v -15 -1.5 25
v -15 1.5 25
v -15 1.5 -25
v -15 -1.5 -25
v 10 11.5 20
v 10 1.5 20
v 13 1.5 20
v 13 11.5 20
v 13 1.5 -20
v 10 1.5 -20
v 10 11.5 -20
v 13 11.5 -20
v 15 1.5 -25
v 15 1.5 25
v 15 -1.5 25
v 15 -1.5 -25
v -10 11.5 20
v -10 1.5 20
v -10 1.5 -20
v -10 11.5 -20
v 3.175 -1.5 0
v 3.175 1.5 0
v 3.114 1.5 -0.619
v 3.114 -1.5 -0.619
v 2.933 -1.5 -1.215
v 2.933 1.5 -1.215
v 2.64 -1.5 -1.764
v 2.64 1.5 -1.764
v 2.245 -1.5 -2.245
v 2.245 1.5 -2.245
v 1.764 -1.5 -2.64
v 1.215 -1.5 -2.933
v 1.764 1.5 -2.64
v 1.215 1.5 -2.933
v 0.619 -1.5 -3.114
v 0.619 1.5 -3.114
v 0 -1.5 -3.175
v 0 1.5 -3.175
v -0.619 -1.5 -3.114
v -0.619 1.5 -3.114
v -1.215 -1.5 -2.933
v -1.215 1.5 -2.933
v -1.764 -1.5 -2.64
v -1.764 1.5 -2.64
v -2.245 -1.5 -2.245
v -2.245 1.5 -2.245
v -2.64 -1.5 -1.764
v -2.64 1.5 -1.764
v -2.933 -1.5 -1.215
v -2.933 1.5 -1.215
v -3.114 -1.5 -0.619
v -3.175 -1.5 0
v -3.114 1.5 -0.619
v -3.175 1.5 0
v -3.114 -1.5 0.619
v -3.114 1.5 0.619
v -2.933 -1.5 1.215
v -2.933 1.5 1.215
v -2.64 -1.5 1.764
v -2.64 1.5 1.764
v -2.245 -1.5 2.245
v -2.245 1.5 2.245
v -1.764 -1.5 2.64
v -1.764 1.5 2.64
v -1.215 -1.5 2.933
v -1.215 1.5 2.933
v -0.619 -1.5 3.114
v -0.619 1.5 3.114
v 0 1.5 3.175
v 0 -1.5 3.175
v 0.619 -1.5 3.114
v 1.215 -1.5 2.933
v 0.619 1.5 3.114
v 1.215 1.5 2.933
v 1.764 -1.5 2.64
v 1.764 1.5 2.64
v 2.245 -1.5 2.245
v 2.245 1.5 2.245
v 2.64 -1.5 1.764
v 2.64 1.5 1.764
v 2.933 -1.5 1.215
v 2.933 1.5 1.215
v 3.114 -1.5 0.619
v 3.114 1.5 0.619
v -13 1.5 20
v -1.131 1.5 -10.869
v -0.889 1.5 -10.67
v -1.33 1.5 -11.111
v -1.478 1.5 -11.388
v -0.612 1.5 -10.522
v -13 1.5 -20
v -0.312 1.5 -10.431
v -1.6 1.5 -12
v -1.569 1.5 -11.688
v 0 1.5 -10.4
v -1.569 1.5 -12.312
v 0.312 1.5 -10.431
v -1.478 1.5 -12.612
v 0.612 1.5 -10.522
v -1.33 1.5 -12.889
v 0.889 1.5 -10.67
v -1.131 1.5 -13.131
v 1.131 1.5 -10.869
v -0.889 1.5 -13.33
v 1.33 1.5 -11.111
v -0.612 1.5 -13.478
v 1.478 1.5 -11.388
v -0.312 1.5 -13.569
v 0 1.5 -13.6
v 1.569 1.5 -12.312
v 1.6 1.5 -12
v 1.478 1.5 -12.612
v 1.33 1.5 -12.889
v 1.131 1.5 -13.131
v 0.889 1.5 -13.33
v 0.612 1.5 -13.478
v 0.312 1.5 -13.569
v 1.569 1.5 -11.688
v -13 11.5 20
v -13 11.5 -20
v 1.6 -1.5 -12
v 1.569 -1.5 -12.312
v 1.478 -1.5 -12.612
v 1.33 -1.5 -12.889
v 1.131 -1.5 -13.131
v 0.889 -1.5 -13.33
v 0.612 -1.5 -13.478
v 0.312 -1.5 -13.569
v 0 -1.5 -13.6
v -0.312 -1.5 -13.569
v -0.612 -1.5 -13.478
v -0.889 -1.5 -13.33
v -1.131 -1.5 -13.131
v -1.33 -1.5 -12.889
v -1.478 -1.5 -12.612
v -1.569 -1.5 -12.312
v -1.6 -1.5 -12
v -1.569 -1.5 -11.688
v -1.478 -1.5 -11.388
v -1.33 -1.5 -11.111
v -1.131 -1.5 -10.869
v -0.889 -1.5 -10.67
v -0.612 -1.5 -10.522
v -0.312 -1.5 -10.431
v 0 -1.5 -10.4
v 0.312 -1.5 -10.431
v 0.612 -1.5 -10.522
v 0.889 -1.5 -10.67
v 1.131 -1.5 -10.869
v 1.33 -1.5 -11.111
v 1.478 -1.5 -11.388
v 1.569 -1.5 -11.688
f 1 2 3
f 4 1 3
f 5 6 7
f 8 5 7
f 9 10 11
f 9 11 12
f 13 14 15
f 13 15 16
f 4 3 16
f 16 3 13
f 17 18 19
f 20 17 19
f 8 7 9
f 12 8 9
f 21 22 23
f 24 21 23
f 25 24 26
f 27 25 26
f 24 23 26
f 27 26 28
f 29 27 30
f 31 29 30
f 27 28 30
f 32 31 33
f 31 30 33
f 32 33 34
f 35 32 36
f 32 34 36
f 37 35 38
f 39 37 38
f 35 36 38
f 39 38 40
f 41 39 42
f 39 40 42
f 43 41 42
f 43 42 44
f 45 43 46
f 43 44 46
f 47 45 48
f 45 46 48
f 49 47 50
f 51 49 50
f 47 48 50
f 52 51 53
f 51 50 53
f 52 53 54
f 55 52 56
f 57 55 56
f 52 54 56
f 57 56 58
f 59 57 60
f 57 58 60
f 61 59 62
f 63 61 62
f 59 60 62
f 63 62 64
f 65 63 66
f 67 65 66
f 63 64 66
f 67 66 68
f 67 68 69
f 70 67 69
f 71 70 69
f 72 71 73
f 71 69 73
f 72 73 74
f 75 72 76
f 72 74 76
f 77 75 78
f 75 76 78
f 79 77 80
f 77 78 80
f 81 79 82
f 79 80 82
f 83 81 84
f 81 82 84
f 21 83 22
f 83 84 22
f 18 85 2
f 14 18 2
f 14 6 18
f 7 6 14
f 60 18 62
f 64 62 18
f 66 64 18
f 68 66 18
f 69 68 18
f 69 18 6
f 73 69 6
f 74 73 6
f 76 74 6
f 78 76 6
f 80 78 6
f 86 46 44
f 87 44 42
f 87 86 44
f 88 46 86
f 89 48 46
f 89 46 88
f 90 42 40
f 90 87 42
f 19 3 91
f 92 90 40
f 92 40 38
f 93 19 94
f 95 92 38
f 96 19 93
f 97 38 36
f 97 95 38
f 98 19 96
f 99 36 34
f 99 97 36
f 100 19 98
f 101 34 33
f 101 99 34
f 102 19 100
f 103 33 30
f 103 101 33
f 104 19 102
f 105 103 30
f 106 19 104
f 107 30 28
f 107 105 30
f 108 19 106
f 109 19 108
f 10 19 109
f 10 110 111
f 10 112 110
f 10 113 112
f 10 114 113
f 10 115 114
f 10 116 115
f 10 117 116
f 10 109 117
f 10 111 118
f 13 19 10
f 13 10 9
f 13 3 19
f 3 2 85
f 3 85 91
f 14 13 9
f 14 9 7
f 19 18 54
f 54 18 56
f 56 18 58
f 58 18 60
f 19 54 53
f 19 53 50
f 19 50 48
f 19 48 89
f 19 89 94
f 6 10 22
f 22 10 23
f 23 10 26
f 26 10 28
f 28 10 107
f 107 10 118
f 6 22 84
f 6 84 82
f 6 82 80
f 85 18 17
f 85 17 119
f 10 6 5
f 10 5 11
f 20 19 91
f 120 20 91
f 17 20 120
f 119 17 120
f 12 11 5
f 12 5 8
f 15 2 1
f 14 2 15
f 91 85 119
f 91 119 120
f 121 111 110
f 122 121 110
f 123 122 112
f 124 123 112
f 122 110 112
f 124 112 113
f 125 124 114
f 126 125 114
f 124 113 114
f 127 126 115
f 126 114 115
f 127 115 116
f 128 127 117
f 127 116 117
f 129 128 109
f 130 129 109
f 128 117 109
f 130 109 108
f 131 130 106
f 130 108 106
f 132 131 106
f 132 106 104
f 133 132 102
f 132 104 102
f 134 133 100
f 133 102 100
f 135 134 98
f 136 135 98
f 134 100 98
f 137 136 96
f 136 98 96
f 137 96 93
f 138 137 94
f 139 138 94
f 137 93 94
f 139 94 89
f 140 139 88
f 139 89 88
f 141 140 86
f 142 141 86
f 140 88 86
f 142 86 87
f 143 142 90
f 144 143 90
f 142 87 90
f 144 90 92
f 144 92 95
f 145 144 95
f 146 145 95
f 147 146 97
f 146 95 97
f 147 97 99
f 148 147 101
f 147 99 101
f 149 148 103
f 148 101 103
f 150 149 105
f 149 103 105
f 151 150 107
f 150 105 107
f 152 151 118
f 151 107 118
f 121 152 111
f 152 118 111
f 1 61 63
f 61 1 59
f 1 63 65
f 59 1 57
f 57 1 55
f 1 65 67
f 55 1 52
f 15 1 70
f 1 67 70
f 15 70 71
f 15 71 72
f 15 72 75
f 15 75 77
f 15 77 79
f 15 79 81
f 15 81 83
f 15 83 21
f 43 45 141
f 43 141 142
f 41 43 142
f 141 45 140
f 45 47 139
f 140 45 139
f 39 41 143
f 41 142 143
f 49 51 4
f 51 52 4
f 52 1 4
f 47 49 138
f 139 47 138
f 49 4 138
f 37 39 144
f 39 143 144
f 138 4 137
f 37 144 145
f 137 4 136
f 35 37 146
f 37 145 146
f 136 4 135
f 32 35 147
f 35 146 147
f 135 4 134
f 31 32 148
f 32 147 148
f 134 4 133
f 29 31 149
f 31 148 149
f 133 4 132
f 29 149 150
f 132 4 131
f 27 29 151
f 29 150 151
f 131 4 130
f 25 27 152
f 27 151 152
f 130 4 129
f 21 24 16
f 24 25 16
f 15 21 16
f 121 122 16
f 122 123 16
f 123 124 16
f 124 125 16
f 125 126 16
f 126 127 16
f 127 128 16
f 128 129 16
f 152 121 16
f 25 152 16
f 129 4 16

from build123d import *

# Parameters (mm, degrees)
SKETCH1_W           = 30
SKETCH1_H           = 50
BOSS_EXTRUDE1_DEPTH = 1.5
SKETCH2_R           = 3.175
SKETCH2_R_2         = 1.6
CUT_EXTRUDE1_DEPTH  = 3
SKETCH3_W           = 3
SKETCH3_H           = 40
BOSS_EXTRUDE2_DEPTH = 10


with BuildPart() as part:
    # Sketch1 → Boss-Extrude1 (new body, symmetric)
    with BuildSketch(Plane(origin=(0, 0, 0), x_dir=(1, 0, 0), z_dir=(0, 1, 0))):
        Rectangle(SKETCH1_W, SKETCH1_H)
    extrude(amount=BOSS_EXTRUDE1_DEPTH, both=True)

    # Sketch2 → Cut-Extrude1 (cut)
    with BuildSketch(Plane(origin=(0, 1.5, 0), x_dir=(1, 0, 0), z_dir=(0, 1, 0))):
        Circle(SKETCH2_R)
        with Locations((0, 12)):
            Circle(SKETCH2_R_2)
    extrude(amount=-CUT_EXTRUDE1_DEPTH, mode=Mode.SUBTRACT)

    # Sketch3 → Boss-Extrude2 (add)
    with BuildSketch(Plane(origin=(0, 1.5, 0), x_dir=(1, 0, 0), z_dir=(0, 1, 0))):
        with Locations((11.5, 0)):
            Rectangle(SKETCH3_W, SKETCH3_H)
    boss_extrude2 = extrude(amount=BOSS_EXTRUDE2_DEPTH)

    # Mirror1: Boss-Extrude2 across plane
    add(boss_extrude2.mirror(Plane(origin=(0, 0, 0), x_dir=(0, 0, 1), z_dir=(1, 0, 0))))


solid = part.part
